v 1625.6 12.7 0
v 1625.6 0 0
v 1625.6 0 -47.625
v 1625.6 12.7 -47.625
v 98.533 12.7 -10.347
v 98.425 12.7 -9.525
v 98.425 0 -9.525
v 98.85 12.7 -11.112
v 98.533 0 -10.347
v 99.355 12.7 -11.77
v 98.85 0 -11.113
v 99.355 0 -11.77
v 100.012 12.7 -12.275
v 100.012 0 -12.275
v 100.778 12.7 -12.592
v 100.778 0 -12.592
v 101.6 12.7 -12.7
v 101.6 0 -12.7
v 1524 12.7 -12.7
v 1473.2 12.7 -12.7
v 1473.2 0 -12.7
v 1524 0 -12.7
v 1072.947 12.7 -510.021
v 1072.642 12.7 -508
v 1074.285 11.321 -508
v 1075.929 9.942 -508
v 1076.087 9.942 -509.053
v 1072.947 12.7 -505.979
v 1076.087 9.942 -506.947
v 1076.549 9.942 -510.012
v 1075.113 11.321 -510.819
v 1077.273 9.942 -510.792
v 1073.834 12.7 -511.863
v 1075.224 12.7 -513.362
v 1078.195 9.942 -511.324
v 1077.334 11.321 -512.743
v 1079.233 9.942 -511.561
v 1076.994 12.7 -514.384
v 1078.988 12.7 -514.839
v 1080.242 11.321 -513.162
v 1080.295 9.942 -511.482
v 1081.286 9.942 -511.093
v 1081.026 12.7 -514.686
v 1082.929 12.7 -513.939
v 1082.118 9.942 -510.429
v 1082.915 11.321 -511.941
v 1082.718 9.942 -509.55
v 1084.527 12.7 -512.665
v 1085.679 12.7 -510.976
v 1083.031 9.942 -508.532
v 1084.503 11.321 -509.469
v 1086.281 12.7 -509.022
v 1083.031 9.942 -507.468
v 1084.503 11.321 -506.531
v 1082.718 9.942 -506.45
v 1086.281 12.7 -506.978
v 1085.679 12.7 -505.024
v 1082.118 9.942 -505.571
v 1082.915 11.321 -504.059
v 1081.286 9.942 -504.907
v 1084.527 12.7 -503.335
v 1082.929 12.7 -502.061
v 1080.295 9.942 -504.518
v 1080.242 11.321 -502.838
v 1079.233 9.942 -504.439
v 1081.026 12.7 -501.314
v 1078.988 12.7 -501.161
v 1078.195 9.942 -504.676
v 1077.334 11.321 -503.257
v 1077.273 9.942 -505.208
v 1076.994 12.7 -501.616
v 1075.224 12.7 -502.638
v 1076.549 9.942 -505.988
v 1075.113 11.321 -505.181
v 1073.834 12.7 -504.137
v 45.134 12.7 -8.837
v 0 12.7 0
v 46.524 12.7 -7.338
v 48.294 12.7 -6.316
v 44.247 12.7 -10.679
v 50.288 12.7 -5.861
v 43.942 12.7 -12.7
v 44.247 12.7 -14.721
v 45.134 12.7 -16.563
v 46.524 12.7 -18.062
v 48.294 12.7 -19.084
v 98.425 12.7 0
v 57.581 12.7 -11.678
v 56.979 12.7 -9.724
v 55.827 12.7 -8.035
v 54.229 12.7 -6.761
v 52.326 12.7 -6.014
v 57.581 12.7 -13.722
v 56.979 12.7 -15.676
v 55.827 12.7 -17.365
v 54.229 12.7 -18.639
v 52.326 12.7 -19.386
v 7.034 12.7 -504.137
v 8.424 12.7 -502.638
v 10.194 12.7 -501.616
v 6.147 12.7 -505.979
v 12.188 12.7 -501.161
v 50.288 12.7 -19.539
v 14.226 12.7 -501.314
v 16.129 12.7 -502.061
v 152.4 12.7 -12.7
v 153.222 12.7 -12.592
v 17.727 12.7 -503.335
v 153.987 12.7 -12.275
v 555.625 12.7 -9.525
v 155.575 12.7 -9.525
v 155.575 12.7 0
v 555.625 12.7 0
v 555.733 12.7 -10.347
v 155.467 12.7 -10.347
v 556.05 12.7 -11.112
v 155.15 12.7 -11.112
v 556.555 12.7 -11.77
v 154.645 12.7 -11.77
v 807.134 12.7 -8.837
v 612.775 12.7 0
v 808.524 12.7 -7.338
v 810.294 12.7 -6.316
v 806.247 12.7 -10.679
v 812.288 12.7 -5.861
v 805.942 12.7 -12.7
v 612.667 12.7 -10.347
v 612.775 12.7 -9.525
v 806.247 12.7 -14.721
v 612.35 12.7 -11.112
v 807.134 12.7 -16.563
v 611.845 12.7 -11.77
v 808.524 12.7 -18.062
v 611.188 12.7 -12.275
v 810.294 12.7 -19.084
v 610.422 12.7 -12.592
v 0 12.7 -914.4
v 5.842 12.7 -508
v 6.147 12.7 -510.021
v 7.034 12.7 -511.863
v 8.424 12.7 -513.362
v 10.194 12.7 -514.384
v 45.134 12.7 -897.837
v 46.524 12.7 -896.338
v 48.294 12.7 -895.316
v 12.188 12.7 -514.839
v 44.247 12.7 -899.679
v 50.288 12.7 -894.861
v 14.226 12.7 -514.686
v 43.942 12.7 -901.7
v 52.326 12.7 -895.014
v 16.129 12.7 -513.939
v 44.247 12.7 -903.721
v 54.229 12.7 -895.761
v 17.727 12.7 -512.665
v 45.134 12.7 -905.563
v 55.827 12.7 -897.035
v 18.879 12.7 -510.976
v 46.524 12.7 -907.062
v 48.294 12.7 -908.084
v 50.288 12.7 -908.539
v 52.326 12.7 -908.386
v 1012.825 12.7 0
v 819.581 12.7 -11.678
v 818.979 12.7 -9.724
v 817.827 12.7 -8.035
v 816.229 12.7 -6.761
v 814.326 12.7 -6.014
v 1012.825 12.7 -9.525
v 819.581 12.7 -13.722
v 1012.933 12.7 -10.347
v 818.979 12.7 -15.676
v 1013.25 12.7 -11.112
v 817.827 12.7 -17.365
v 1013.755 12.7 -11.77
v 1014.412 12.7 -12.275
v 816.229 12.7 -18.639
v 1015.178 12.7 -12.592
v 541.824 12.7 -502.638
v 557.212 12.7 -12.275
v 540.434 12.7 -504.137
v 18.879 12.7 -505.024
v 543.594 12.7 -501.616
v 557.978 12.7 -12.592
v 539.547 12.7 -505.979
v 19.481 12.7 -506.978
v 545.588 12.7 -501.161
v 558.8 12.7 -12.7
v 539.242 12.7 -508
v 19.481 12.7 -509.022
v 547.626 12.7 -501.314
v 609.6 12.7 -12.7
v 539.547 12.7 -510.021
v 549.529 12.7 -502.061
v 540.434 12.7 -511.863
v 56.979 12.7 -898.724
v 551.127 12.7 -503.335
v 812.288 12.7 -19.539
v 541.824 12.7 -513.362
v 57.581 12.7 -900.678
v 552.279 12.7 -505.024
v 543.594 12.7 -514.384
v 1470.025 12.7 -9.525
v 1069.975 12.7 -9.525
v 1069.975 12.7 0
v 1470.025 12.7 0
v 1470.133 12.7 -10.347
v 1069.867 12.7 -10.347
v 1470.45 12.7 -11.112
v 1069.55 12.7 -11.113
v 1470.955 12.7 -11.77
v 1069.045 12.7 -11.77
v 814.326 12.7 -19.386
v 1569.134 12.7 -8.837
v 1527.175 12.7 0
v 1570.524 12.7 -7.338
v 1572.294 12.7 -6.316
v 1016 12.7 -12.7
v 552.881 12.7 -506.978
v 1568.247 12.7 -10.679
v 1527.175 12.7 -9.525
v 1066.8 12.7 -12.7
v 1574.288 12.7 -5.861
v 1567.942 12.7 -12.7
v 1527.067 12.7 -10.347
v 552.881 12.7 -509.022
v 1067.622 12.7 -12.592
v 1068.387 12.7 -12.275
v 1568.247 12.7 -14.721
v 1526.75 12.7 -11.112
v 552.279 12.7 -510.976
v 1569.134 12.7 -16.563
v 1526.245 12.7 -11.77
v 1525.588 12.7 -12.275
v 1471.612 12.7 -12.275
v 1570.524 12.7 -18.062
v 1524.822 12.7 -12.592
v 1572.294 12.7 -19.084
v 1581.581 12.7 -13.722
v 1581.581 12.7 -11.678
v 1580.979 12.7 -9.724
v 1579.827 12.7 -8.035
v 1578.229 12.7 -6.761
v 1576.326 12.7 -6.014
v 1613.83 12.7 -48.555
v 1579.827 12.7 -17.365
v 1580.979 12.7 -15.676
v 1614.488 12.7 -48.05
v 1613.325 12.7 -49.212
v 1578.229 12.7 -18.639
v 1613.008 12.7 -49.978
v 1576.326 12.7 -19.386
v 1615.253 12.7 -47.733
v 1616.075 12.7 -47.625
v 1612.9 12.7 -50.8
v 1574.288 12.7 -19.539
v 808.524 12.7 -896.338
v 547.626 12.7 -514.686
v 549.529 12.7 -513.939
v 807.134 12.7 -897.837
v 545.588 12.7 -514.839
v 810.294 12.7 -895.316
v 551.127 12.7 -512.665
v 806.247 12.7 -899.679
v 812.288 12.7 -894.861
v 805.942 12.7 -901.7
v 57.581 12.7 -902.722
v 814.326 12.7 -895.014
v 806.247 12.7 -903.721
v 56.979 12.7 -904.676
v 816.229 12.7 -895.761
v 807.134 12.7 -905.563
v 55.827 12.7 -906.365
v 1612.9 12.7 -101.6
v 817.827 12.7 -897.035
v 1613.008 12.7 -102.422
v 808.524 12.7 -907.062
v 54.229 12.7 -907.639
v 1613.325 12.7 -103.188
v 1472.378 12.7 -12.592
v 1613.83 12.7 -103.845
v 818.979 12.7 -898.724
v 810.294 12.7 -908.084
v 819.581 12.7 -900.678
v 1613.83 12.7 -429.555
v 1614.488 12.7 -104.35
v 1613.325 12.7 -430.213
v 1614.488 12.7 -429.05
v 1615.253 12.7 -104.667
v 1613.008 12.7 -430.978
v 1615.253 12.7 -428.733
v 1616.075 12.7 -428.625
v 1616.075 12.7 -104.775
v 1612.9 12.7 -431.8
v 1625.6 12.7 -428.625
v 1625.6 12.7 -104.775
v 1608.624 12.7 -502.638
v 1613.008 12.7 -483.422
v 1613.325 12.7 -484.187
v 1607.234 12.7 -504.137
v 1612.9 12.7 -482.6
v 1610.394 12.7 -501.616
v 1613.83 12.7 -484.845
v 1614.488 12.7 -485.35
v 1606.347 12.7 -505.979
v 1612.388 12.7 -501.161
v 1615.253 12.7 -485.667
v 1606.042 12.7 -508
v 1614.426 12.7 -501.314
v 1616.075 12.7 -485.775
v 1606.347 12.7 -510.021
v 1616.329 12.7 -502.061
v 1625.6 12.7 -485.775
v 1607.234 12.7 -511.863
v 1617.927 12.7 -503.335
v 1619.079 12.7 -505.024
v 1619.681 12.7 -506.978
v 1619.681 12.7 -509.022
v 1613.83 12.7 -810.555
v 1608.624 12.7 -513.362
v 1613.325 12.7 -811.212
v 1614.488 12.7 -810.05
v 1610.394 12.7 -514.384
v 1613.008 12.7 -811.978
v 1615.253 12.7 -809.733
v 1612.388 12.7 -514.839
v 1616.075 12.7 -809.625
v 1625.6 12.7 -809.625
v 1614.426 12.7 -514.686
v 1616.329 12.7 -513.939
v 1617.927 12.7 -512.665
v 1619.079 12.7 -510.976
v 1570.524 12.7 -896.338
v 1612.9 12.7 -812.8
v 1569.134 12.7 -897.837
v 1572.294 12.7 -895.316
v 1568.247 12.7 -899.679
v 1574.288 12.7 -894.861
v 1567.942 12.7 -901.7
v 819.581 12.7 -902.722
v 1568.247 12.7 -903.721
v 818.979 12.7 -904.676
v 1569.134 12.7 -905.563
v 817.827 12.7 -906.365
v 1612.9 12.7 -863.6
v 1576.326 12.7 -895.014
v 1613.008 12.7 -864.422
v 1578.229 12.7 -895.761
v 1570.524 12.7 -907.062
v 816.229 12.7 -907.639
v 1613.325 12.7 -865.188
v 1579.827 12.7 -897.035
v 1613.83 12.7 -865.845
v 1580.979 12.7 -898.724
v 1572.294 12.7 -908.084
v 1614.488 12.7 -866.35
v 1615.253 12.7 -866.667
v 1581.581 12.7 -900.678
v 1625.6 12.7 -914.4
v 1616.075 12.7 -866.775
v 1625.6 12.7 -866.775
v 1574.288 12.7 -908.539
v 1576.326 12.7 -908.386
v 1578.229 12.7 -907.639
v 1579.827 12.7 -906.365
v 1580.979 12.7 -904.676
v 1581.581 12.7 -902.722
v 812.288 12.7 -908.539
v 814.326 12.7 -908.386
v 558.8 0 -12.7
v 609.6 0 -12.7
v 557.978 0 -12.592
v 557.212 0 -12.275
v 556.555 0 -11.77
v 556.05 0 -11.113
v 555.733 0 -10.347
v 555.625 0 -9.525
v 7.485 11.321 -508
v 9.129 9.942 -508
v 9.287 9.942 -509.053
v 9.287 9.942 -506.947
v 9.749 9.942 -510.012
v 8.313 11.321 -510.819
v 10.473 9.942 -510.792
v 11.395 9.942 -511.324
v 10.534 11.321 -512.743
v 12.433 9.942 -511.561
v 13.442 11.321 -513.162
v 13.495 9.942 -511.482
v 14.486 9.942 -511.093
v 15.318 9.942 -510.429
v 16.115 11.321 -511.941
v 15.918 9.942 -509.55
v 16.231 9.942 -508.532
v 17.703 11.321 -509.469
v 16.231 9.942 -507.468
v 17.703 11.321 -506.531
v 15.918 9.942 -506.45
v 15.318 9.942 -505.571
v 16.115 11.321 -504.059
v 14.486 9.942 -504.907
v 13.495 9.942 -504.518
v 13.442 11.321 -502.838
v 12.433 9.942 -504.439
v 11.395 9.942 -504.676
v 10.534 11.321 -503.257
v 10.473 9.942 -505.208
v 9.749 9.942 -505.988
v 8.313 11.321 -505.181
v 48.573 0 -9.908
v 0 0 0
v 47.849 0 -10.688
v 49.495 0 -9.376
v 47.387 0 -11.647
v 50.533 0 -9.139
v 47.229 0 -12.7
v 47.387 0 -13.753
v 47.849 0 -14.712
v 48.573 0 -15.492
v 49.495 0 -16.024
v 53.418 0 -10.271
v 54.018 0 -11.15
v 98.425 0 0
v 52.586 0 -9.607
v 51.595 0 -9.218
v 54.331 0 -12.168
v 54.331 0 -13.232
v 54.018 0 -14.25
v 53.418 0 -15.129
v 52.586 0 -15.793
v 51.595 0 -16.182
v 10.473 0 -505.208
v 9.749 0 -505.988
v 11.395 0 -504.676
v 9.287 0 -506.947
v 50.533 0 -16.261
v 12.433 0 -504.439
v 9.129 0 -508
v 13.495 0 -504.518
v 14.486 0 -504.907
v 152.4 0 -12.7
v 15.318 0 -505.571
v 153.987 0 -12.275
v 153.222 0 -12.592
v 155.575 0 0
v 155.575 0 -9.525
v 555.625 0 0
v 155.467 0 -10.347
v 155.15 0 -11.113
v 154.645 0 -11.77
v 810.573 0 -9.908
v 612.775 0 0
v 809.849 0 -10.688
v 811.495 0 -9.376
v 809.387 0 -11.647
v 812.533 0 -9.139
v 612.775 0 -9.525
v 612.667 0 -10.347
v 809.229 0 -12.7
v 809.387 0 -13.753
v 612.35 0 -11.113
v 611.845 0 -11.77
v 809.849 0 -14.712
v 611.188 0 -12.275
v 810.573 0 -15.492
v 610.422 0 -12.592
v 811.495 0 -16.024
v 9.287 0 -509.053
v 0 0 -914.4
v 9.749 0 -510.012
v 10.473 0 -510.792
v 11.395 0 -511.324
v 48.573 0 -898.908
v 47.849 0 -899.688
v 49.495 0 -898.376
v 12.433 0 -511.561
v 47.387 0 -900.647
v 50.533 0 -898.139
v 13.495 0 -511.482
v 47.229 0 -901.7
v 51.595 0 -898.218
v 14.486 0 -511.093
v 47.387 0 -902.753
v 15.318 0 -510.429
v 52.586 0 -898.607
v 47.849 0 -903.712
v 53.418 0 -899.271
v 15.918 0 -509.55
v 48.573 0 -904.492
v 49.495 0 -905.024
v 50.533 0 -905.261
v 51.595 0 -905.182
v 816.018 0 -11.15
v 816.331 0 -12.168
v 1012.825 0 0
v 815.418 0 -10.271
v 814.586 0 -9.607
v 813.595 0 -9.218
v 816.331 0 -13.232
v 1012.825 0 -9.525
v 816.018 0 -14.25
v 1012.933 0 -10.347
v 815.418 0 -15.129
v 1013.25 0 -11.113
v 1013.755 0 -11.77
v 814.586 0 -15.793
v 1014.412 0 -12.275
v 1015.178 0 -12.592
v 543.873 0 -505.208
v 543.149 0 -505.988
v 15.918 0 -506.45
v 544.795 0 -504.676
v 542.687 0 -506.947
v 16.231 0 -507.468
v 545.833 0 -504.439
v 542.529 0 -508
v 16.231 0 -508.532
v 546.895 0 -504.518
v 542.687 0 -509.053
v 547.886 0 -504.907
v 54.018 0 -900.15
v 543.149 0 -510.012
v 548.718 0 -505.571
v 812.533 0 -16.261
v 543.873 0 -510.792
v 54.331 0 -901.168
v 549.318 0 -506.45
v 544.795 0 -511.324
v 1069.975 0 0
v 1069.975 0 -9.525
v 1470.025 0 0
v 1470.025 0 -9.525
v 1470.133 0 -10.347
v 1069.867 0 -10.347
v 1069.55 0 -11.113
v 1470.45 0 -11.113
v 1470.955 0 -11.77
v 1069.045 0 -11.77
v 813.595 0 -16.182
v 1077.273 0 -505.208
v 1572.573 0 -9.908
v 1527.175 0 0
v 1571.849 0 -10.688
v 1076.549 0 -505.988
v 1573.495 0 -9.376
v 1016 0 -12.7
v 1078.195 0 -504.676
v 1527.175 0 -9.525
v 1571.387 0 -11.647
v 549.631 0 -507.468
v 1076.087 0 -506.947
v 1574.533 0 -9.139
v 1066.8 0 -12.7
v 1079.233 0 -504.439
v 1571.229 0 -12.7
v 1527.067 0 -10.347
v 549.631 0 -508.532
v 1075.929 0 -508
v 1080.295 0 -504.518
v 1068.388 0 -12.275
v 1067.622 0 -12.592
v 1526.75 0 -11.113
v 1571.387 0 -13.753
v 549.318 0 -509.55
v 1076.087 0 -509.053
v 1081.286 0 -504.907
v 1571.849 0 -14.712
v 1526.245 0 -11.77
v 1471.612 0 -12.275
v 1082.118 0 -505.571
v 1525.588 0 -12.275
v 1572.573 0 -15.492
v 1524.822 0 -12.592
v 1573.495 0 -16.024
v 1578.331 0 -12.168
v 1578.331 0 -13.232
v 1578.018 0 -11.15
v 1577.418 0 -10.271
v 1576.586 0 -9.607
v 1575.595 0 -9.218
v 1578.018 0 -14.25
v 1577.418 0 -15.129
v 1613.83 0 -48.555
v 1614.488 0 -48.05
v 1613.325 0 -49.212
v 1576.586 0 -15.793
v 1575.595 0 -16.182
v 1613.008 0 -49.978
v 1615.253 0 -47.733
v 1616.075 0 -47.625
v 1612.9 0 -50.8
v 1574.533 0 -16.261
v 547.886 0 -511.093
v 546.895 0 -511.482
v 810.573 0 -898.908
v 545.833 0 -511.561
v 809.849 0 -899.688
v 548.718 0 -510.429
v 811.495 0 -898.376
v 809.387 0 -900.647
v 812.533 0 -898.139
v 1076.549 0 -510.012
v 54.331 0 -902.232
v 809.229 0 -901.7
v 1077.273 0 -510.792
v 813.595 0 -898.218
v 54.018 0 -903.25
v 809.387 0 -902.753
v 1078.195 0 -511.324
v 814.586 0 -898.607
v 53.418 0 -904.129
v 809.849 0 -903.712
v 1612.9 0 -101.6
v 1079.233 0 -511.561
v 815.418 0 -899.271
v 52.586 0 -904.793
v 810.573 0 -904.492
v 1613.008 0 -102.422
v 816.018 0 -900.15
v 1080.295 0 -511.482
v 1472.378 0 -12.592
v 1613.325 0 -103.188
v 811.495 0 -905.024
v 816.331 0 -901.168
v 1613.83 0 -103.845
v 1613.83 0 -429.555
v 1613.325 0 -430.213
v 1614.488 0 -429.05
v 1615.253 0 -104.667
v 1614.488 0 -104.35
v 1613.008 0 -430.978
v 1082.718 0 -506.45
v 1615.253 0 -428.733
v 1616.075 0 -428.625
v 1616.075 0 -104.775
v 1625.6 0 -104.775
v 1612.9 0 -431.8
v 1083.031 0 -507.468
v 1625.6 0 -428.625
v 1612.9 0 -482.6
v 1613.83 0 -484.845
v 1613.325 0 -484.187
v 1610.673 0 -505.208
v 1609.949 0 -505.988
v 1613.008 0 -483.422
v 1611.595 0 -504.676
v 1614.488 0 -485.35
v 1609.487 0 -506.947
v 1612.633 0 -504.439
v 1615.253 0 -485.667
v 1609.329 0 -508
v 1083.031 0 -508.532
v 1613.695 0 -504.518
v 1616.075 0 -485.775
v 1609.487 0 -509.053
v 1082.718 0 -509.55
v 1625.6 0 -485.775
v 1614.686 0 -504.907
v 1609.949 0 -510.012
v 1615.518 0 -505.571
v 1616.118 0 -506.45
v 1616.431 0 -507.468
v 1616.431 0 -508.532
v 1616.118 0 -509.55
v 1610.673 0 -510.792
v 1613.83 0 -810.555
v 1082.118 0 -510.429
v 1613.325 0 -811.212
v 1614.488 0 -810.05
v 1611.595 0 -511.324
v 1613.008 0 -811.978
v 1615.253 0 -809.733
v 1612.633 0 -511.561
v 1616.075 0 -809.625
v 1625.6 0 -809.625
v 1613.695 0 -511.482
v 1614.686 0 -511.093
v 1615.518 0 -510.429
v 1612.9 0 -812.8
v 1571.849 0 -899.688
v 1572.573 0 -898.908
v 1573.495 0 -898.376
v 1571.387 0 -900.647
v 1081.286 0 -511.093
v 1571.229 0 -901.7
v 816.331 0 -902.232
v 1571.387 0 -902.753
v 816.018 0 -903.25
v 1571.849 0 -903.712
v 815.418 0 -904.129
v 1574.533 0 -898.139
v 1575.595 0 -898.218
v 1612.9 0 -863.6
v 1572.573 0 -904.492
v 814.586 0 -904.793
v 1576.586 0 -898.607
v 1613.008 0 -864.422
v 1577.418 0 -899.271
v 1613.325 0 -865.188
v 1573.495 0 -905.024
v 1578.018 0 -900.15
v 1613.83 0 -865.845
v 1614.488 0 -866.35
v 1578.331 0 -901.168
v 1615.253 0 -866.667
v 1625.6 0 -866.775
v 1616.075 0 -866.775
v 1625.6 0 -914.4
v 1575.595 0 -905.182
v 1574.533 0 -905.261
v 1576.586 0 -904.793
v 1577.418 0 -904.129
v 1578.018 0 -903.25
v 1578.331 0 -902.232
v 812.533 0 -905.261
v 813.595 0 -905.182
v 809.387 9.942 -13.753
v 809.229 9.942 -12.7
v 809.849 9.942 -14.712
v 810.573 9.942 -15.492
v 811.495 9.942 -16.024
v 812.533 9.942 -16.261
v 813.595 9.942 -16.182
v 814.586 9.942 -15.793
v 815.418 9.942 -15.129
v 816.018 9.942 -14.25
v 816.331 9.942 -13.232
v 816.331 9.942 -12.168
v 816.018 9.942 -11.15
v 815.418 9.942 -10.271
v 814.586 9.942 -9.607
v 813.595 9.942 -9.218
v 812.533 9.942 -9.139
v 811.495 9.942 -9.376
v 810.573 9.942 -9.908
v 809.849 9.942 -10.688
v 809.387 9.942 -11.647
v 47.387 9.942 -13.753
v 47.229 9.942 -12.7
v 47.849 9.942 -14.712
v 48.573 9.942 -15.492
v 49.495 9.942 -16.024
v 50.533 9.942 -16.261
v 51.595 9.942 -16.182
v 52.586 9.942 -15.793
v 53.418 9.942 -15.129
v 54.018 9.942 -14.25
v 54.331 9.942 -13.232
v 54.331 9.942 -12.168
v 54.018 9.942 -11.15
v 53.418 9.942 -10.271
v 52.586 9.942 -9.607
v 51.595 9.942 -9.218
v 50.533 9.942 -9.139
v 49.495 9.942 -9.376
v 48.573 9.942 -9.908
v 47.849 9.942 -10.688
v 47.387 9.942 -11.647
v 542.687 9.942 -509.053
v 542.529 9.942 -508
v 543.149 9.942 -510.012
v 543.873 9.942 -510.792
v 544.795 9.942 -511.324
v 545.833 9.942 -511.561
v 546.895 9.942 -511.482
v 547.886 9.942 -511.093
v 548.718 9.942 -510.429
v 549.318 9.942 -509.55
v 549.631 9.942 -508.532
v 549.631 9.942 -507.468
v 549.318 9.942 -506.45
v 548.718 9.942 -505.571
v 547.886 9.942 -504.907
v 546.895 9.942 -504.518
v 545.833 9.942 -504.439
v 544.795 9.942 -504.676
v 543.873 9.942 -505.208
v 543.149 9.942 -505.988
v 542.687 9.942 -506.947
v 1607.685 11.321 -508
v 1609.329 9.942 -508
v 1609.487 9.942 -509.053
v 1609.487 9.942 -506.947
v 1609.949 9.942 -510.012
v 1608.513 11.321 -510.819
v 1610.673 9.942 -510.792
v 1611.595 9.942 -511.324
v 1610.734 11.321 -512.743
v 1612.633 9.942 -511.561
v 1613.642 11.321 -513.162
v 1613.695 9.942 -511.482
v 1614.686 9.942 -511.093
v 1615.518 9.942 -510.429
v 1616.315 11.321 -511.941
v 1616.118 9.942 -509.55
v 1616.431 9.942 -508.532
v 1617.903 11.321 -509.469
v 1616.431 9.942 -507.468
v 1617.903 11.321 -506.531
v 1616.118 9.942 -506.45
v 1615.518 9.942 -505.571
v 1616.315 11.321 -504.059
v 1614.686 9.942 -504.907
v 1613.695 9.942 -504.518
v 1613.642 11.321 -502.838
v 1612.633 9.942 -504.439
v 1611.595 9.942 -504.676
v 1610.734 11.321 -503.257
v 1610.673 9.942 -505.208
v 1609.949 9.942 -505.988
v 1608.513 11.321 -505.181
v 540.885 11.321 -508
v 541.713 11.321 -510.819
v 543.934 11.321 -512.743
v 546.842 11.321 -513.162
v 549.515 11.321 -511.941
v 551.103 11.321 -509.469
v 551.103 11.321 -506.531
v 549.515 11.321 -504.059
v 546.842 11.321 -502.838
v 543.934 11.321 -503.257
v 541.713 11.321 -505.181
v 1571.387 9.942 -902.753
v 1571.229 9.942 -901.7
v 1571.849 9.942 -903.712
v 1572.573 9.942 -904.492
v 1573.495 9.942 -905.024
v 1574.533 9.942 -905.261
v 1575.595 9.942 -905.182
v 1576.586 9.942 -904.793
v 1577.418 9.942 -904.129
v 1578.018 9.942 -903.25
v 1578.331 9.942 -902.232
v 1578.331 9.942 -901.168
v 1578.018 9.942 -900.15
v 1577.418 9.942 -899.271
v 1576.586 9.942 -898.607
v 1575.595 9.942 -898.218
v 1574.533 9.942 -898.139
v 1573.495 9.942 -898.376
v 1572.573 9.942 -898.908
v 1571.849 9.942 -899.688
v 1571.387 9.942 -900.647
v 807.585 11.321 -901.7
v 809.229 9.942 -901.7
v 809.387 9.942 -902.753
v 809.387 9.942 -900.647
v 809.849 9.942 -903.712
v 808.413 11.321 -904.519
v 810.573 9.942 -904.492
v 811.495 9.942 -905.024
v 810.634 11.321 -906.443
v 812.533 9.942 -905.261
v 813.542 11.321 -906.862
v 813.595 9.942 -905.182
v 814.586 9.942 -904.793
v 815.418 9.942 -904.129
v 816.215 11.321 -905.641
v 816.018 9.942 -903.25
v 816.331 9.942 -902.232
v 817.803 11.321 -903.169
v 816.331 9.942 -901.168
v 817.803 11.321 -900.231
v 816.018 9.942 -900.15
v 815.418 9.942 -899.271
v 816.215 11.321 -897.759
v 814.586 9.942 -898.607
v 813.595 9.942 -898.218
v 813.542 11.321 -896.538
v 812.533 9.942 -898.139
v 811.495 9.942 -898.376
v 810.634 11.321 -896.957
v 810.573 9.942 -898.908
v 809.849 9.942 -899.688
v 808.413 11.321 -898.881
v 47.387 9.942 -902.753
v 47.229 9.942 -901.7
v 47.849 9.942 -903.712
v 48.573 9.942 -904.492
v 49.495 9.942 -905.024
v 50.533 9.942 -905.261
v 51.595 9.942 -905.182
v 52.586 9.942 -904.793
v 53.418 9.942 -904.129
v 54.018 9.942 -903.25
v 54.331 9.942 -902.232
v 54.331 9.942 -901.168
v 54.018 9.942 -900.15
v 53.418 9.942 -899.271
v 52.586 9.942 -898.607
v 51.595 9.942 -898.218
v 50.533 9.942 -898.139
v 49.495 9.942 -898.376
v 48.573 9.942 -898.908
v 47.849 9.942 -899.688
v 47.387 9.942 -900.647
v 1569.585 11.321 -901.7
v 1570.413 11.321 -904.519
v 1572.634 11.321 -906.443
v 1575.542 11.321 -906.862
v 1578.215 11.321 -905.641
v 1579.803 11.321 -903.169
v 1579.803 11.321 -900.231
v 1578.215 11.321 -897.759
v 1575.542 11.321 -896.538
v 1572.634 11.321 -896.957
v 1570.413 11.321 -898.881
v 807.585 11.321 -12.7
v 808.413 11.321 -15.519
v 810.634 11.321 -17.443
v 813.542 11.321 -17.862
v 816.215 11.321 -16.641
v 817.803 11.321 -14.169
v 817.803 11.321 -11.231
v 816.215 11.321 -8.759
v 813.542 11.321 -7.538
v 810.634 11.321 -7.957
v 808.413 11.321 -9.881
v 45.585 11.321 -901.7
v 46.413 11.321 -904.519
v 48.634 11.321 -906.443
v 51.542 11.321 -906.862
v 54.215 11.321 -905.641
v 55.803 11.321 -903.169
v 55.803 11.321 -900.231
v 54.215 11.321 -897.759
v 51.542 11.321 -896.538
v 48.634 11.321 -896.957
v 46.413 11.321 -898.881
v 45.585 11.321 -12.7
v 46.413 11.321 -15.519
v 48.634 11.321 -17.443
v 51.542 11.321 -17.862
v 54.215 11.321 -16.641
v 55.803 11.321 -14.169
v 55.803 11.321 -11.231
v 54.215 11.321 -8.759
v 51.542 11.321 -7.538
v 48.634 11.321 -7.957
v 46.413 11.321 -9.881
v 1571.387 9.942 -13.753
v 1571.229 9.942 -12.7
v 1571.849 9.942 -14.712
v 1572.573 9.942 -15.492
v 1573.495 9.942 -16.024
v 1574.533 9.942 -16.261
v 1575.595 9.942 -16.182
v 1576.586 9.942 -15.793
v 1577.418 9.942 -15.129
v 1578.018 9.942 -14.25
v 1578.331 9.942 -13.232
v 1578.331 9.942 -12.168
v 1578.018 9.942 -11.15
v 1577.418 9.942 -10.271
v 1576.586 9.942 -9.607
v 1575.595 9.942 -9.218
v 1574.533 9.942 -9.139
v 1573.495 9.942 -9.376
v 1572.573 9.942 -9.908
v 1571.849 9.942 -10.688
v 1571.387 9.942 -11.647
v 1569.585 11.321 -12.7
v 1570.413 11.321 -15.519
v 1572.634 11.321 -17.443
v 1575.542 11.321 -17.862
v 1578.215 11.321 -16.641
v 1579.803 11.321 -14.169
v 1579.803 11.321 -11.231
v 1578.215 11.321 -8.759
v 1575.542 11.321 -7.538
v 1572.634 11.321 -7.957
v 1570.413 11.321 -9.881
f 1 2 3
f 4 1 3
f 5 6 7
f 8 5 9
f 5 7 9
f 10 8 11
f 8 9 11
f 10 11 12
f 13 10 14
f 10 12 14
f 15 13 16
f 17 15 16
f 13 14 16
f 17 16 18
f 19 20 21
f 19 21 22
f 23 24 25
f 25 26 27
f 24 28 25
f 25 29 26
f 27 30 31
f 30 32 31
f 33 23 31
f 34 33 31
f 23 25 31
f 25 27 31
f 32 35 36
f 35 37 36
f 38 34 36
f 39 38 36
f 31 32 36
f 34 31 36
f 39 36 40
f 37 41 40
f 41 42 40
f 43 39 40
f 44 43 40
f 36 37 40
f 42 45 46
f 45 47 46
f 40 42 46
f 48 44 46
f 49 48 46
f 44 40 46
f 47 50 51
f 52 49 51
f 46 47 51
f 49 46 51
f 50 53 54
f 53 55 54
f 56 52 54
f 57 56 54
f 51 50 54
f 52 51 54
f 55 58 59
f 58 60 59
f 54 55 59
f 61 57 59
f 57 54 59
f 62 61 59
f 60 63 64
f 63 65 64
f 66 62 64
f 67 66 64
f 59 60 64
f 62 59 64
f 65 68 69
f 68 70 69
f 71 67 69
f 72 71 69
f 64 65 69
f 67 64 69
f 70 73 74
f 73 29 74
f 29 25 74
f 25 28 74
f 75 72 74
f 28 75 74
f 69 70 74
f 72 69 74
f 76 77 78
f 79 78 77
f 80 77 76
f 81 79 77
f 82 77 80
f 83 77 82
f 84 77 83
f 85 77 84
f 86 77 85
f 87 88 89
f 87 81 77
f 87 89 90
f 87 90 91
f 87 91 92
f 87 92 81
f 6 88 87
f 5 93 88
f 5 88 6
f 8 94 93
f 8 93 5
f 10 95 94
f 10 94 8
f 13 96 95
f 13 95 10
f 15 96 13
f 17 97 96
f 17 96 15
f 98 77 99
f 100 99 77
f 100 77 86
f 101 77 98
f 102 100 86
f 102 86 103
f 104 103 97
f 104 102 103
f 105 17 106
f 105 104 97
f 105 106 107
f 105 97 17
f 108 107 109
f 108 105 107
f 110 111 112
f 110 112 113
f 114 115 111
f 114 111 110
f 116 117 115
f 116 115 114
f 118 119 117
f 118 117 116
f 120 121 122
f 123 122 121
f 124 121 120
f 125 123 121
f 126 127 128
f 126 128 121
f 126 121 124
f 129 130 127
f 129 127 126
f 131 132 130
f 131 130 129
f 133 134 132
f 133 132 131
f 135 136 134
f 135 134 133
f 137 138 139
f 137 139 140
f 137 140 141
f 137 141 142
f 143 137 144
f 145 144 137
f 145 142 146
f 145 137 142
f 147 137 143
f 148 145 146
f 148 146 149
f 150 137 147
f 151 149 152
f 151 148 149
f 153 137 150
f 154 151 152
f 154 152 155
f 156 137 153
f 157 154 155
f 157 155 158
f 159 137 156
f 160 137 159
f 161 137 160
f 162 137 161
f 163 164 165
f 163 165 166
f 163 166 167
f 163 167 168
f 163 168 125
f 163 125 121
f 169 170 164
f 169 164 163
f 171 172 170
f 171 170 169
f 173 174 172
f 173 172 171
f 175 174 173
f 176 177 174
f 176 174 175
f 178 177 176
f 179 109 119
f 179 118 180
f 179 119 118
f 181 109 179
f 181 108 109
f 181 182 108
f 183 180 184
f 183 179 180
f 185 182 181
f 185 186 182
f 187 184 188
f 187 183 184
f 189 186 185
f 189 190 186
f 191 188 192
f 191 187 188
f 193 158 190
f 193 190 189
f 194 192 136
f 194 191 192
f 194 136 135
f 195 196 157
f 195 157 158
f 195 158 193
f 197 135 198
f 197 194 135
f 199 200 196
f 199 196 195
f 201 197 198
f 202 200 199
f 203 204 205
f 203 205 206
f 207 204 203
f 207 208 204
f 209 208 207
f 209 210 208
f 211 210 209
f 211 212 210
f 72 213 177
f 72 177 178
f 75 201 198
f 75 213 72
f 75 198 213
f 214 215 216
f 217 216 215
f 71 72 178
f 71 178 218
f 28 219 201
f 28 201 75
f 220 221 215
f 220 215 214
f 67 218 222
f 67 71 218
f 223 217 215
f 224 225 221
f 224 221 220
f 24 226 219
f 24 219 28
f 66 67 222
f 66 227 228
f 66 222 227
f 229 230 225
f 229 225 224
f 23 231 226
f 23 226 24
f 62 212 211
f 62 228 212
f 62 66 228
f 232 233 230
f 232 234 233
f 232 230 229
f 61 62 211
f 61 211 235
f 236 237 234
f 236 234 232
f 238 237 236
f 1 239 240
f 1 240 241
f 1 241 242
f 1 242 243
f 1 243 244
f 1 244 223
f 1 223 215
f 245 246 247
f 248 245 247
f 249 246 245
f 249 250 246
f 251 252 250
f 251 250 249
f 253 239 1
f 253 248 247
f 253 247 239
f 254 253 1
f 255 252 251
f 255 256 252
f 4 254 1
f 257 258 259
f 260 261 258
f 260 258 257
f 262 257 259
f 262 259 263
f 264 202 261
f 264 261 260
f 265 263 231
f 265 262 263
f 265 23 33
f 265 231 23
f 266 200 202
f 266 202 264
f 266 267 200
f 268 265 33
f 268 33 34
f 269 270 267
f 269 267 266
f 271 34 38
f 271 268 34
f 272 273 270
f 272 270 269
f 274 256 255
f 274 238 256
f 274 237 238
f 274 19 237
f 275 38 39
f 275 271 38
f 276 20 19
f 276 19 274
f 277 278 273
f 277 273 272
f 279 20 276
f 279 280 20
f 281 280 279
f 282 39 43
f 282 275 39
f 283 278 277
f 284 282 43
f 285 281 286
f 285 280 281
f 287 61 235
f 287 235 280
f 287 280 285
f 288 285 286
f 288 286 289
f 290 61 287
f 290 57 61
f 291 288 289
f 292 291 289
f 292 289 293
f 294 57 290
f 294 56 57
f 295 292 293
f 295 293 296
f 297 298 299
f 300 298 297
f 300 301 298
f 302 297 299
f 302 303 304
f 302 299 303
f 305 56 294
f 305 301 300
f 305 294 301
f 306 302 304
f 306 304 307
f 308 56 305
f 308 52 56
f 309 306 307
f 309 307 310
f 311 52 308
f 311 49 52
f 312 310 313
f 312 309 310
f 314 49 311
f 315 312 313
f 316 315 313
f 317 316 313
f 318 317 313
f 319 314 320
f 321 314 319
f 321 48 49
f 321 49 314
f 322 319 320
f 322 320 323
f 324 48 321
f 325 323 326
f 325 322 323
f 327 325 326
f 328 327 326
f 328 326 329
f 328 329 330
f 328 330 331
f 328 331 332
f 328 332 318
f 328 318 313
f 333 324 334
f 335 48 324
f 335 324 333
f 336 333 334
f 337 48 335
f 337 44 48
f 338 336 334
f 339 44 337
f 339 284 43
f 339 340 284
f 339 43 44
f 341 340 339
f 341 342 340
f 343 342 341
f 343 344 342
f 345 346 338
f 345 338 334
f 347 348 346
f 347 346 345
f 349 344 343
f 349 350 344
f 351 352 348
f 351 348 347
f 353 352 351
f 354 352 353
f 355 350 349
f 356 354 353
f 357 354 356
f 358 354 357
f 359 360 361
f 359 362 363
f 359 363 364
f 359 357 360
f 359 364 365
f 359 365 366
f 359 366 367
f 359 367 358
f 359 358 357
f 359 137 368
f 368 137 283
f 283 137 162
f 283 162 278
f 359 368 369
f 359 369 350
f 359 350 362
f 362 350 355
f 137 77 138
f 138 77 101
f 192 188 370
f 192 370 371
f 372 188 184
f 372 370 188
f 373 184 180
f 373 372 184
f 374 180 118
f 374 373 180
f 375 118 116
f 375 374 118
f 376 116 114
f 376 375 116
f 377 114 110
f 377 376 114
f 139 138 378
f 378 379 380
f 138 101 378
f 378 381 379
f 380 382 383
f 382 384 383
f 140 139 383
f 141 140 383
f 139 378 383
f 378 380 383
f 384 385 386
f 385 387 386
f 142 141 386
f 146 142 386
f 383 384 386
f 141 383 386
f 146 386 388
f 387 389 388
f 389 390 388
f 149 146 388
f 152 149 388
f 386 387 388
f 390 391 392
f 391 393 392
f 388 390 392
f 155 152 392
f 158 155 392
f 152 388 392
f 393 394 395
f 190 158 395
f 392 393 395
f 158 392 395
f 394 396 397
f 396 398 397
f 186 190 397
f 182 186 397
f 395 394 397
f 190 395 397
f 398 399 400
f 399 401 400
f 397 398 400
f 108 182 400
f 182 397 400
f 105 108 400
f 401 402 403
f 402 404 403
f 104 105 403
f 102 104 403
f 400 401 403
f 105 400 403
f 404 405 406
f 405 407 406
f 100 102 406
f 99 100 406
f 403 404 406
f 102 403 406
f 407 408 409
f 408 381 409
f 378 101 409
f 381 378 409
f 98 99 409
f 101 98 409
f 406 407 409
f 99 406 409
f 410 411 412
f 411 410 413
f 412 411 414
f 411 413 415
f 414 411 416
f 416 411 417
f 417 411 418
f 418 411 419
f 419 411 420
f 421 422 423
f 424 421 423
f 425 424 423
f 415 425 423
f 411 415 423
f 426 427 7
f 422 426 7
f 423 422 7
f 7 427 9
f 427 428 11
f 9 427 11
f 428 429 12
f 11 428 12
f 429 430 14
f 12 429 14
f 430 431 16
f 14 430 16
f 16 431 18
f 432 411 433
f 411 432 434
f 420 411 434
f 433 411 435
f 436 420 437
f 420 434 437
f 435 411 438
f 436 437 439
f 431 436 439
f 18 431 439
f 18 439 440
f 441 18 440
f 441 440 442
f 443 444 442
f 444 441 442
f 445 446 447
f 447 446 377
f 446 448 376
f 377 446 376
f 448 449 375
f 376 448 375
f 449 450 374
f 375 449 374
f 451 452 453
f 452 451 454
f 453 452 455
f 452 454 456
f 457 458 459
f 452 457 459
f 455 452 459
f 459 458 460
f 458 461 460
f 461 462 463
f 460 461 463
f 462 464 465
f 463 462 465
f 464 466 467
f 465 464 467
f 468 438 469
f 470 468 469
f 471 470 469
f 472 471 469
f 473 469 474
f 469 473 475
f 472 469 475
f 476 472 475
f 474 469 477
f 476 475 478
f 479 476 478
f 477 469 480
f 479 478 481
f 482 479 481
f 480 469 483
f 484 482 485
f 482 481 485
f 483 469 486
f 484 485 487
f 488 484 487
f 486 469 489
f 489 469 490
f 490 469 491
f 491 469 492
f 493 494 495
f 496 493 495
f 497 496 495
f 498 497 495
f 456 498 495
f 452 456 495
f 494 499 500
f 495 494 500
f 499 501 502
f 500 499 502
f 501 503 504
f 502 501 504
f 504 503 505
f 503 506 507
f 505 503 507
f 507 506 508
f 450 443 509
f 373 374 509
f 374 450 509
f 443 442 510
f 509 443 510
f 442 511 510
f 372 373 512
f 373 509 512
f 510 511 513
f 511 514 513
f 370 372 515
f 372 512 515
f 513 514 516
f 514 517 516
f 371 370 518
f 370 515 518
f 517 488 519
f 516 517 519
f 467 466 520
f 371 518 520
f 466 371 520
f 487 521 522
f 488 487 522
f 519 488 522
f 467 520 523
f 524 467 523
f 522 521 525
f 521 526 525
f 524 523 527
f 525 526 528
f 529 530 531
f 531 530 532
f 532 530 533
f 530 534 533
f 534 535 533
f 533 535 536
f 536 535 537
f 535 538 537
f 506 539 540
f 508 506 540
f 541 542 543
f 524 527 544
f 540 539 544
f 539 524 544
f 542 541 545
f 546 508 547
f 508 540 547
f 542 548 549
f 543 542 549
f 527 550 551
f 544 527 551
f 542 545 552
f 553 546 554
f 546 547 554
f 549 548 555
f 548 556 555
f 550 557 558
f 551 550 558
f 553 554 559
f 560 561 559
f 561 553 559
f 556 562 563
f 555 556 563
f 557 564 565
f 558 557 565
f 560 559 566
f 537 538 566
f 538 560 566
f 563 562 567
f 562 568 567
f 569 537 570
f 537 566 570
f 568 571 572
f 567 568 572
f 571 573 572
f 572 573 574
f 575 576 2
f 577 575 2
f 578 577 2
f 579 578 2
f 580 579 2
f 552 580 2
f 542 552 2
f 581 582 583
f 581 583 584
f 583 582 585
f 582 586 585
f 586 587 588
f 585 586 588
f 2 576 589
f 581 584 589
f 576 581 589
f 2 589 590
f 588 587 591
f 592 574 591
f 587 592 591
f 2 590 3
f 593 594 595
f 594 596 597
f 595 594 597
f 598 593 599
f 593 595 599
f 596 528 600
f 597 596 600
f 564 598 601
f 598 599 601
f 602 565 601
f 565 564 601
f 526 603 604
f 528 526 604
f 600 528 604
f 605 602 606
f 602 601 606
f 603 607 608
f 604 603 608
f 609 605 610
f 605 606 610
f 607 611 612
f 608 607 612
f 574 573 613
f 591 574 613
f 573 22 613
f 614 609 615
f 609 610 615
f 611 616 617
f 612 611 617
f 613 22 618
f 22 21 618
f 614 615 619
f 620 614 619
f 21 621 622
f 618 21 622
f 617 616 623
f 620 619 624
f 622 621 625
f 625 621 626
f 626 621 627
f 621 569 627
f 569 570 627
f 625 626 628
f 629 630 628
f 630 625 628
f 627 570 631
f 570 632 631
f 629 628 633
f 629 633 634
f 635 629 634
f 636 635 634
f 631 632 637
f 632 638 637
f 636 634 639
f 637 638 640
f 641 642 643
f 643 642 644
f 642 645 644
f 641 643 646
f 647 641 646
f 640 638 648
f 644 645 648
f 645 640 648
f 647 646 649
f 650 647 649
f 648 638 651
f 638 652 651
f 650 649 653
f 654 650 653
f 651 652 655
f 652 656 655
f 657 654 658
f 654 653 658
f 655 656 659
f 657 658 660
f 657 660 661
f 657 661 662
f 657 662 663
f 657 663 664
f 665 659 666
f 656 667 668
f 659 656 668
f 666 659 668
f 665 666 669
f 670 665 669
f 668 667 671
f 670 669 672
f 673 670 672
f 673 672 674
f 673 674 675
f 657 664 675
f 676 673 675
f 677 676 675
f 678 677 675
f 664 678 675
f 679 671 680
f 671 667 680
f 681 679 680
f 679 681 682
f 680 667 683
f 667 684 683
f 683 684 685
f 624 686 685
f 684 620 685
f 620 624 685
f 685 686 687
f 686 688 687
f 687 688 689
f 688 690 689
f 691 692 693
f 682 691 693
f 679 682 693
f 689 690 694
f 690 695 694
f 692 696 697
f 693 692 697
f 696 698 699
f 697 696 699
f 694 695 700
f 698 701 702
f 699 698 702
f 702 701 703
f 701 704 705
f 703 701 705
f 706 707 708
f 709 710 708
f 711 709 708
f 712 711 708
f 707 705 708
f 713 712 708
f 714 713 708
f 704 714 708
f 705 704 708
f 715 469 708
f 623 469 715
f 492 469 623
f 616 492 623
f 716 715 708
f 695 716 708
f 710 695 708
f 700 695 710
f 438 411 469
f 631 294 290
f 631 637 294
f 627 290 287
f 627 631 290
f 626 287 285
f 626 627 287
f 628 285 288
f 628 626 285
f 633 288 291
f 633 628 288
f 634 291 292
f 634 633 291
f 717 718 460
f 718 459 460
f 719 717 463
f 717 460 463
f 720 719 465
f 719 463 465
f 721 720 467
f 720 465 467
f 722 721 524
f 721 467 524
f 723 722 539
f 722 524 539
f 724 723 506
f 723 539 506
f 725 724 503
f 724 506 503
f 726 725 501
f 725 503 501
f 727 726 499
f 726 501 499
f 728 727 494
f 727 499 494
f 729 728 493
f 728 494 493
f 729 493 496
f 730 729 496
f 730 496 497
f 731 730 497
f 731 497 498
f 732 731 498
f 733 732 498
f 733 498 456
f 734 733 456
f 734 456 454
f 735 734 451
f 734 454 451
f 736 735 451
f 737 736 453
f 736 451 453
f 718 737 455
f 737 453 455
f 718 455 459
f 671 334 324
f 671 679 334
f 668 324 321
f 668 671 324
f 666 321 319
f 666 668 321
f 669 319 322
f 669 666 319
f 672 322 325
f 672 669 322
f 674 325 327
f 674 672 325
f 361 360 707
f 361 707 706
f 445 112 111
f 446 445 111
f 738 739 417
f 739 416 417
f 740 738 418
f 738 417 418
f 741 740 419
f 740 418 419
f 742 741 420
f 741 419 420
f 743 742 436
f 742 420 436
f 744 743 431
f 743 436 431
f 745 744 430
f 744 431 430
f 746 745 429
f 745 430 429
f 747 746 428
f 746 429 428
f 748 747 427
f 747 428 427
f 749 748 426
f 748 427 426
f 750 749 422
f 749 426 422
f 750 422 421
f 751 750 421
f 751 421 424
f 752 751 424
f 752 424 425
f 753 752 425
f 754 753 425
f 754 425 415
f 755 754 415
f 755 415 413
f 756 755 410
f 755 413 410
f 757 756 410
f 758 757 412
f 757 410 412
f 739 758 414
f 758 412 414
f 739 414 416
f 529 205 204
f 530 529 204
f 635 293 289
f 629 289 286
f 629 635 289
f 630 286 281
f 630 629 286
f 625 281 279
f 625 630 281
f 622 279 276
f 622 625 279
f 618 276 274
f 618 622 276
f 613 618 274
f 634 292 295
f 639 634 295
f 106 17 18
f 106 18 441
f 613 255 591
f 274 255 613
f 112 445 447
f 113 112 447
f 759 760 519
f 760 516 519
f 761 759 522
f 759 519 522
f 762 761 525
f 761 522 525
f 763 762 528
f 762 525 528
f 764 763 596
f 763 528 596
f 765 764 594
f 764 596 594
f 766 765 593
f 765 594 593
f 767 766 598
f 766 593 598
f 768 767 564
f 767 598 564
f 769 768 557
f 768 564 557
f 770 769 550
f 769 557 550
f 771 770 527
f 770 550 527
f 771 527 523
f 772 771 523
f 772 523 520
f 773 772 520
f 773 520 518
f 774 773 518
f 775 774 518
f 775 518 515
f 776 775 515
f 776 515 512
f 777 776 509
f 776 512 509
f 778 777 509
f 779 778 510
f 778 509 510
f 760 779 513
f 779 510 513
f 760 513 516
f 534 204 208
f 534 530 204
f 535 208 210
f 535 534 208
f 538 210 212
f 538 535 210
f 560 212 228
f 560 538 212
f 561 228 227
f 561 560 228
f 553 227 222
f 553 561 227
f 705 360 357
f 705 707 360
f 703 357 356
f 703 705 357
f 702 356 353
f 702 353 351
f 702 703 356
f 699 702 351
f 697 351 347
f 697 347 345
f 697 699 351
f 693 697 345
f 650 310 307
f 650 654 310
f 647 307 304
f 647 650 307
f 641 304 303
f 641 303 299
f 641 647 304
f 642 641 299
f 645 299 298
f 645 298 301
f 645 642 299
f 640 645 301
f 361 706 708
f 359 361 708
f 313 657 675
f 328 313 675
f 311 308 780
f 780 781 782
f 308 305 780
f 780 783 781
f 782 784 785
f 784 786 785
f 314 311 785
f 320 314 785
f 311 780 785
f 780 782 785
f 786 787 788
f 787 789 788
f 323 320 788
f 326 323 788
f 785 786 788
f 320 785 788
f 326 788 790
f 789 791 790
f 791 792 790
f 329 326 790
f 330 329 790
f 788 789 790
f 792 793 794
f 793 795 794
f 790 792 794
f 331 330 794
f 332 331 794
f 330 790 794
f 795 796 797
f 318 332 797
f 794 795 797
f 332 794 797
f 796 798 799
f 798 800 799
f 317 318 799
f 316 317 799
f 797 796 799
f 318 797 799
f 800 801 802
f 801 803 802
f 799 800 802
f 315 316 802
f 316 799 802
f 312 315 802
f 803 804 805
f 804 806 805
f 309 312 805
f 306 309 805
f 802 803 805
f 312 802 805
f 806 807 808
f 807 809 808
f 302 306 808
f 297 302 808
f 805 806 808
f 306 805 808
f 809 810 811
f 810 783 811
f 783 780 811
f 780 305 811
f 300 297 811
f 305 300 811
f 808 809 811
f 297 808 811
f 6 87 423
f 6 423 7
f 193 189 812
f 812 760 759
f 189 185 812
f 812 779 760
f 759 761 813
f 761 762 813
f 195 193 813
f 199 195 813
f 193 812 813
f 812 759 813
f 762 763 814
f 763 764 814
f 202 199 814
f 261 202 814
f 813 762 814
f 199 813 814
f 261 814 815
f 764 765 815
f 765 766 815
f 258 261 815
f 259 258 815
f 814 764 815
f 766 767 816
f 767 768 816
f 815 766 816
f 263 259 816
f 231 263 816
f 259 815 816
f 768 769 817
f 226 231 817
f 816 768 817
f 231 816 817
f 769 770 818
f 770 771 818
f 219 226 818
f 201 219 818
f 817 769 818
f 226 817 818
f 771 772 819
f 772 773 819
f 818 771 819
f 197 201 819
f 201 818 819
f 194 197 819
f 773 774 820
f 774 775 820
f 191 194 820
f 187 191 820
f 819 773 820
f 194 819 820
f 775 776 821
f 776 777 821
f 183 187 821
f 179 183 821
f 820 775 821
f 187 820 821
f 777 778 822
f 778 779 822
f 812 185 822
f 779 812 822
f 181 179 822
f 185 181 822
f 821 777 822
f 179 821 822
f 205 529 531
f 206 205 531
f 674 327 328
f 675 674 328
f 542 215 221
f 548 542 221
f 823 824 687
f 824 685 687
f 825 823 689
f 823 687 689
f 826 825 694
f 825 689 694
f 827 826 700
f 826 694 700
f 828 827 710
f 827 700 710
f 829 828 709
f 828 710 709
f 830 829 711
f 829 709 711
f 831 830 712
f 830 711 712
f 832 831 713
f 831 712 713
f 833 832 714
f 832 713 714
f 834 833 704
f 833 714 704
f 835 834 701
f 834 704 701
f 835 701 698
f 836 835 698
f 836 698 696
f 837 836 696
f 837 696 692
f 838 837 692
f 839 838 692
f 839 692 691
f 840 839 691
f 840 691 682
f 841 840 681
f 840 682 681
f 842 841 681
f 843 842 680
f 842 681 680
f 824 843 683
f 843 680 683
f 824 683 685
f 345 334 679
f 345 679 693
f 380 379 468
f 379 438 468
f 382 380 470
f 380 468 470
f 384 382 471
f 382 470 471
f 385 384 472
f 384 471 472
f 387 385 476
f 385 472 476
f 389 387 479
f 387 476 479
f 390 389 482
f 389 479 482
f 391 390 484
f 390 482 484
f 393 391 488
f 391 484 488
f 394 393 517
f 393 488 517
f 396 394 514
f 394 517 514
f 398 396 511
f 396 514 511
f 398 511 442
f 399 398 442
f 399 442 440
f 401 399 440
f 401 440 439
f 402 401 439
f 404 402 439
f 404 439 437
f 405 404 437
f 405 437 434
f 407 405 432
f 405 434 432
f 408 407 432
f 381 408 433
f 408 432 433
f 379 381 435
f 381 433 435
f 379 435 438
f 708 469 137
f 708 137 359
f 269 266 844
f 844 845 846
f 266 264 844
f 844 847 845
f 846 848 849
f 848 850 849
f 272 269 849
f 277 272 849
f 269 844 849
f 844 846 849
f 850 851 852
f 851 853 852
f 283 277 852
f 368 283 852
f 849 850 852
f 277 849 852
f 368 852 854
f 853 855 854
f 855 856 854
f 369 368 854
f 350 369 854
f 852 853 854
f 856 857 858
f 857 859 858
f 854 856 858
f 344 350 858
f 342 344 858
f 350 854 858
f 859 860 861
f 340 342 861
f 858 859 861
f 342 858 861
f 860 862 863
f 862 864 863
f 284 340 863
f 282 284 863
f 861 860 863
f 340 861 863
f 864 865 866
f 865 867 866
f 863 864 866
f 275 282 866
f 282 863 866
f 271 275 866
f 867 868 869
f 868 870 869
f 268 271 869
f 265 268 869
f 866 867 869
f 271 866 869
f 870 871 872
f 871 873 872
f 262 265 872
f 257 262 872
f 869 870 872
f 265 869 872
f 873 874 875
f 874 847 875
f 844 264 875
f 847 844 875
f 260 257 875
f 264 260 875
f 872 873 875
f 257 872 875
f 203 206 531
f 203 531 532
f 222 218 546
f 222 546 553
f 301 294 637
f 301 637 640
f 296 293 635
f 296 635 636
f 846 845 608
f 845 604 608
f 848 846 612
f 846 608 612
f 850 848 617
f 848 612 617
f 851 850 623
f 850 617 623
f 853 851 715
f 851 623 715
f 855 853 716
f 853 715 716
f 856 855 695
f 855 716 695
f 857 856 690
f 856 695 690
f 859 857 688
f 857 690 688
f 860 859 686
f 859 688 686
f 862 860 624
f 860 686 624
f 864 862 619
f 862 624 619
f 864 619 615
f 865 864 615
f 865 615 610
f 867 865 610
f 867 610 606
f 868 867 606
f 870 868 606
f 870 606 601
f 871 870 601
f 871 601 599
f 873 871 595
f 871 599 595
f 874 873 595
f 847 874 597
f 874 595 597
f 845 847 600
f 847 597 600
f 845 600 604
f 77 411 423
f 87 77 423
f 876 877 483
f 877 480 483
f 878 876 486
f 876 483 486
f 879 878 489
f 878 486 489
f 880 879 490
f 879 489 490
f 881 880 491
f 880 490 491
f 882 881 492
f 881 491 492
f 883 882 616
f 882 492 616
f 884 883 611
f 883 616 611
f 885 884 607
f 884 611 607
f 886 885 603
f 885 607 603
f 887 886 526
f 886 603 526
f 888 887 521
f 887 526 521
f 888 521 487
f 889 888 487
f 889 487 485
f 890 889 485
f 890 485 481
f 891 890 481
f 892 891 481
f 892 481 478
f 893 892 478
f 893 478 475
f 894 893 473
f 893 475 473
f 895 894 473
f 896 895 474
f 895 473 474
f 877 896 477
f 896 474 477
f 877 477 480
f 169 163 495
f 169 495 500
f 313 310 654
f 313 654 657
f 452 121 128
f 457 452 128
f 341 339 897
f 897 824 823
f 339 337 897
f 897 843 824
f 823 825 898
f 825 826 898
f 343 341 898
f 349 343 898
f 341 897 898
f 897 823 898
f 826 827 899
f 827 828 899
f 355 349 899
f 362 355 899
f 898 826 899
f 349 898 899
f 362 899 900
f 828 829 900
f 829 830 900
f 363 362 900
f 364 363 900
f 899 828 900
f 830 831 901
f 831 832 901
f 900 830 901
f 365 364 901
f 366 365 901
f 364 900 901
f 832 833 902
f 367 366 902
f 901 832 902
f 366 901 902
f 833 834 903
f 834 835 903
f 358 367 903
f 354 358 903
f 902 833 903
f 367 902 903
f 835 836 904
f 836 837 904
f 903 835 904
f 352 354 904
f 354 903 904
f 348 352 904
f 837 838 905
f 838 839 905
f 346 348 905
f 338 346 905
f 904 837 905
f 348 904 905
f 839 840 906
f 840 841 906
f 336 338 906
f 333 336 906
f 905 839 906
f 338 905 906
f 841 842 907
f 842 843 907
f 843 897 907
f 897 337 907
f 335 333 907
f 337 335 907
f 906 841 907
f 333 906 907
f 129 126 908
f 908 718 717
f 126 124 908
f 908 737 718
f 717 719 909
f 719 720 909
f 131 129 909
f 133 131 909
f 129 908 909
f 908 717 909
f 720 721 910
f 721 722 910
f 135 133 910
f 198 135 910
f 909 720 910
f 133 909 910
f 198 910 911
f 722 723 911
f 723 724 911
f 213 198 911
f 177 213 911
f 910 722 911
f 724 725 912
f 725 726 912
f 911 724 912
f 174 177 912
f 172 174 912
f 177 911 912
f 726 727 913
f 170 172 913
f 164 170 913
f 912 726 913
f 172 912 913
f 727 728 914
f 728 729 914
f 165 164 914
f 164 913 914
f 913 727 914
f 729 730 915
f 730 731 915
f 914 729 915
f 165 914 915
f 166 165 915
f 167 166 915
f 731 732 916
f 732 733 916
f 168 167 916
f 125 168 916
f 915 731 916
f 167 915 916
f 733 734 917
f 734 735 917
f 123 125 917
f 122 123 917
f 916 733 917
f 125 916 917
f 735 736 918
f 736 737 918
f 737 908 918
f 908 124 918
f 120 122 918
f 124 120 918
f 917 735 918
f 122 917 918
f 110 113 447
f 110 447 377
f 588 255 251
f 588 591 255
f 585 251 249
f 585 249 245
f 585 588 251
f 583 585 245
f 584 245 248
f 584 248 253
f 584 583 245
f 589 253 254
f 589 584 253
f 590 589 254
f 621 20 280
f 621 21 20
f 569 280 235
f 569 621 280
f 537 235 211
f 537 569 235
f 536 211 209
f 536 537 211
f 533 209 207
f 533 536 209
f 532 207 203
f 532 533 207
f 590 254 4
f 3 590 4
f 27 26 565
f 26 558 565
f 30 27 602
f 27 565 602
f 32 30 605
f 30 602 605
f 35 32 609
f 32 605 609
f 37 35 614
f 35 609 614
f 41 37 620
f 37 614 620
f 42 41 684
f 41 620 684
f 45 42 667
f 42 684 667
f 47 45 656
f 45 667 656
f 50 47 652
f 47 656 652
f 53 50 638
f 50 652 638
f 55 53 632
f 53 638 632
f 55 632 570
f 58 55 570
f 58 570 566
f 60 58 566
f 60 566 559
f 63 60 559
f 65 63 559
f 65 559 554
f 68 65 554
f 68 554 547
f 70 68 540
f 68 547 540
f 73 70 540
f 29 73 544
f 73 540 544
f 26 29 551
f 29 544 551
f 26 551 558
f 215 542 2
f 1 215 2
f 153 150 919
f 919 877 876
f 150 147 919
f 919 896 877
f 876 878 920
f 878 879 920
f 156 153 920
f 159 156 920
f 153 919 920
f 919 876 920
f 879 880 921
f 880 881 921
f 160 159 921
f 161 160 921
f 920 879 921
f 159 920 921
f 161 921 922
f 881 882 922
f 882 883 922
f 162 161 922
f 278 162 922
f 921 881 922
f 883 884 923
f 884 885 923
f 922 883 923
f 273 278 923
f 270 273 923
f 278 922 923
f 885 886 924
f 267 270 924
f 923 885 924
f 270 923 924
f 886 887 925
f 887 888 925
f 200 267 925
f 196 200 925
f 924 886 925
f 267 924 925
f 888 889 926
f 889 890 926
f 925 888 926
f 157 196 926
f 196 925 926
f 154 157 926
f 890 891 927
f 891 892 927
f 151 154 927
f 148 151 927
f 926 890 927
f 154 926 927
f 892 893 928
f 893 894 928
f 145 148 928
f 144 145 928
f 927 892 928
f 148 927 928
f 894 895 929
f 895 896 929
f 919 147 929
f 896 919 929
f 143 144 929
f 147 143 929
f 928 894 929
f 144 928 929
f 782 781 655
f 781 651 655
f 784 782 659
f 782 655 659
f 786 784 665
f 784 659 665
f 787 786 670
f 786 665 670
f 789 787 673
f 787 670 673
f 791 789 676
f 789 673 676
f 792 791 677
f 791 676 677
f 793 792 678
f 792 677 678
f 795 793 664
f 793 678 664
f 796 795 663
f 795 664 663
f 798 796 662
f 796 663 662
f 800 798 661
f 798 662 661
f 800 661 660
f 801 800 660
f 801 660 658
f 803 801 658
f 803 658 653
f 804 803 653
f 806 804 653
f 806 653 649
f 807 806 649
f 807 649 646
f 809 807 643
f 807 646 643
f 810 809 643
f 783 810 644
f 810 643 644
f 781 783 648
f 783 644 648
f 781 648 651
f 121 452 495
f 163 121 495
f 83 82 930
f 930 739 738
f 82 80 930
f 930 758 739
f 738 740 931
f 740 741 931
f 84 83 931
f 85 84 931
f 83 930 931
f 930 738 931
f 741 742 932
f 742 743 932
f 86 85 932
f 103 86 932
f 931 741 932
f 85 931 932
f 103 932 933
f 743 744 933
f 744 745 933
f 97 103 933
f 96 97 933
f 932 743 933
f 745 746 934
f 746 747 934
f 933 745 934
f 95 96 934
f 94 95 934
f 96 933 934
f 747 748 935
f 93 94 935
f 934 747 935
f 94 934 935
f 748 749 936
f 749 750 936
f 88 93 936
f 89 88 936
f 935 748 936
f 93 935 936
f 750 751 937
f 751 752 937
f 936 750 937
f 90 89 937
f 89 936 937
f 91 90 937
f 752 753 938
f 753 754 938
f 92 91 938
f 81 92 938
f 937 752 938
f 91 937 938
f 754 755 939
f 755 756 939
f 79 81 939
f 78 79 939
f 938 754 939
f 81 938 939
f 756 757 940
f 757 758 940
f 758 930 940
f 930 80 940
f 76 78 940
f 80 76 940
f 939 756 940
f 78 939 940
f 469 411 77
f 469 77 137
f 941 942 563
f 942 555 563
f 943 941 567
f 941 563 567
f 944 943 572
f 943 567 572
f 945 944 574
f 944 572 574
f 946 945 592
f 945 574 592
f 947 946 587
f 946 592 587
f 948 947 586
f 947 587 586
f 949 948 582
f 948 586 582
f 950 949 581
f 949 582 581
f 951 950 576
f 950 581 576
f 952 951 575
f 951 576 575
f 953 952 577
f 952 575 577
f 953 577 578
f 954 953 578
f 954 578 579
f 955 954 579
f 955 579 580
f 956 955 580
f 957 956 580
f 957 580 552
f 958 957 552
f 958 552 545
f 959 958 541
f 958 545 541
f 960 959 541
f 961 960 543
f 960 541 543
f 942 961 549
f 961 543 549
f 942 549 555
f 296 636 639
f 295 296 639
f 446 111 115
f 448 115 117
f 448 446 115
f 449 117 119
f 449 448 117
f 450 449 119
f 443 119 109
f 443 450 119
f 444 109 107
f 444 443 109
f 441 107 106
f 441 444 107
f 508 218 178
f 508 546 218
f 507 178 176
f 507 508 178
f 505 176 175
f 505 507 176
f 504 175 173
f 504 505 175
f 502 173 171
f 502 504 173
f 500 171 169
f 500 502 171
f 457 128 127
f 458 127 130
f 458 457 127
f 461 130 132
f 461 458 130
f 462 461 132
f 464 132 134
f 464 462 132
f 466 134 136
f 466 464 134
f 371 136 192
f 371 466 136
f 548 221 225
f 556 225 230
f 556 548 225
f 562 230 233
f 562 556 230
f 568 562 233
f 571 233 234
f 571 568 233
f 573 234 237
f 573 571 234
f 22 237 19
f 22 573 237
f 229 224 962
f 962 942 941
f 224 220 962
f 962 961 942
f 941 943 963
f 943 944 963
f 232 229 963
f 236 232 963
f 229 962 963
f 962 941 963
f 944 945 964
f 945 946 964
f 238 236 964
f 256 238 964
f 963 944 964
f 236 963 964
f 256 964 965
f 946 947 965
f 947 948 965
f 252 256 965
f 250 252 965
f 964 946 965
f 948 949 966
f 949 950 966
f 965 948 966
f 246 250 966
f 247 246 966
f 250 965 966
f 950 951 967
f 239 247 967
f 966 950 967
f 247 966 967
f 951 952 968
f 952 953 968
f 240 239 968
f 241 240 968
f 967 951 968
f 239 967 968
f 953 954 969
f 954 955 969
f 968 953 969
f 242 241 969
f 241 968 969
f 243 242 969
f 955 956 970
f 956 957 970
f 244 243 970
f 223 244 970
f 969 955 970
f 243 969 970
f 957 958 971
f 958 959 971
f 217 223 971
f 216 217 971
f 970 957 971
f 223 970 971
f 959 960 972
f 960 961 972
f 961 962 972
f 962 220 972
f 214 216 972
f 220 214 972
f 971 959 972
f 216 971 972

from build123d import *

# Parameters (mm, degrees)
SKETCH1_W                                           = 1625.6
SKETCH1_H                                           = 914.4
BOSS_EXTRUDE1_DEPTH                                 = 12.7
CSK_FOR_1_4_FLAT_HEAD_MACHINE_SCREW_100_D           = 7.14248
CSK_FOR_1_4_FLAT_HEAD_MACHINE_SCREW_100_CSINK_D     = 13.716
CSK_FOR_1_4_FLAT_HEAD_MACHINE_SCREW_100_CSINK_ANGLE = 100
SKETCH5_W                                           = 57.15
SKETCH5_H                                           = 12.7
CUT_EXTRUDE1_DEPTH                                  = 13.7
LPATTERN1_COUNT                                     = 4
LPATTERN1_PITCH                                     = 457.2
SKETCH6_W                                           = 12.7
SKETCH6_H                                           = 57.15
CUT_EXTRUDE2_DEPTH                                  = 13.7
LPATTERN2_COUNT                                     = 3
LPATTERN2_PITCH                                     = 381
FILLET1_R                                           = 3.175


with BuildPart() as part:
    # Sketch1 → Boss-Extrude1 (new body)
    with BuildSketch(Plane(origin=(0, 0, 0), x_dir=(1, 0, 0), z_dir=(0, 1, 0))):
        with Locations((812.8, 457.2)):
            Rectangle(SKETCH1_W, SKETCH1_H)
    extrude(amount=BOSS_EXTRUDE1_DEPTH)

    # CSK for 1/4 Flat Head Machine Screw (100)1 (through all)
    with Locations(Plane(origin=(0, 12.7, 0), x_dir=(1, 0, 0), z_dir=(0, 1, 0))):
        with Locations((12.7, 508), (50.8, 901.7), (546.1, 508), (812.8, 901.7), (1079.5, 508), (1574.8, 901.7), (1612.9, 508), (1574.8, 12.7), (812.8, 12.7), (50.8, 12.7)):
            CounterSinkHole(CSK_FOR_1_4_FLAT_HEAD_MACHINE_SCREW_100_D / 2, CSK_FOR_1_4_FLAT_HEAD_MACHINE_SCREW_100_CSINK_D / 2, counter_sink_angle=CSK_FOR_1_4_FLAT_HEAD_MACHINE_SCREW_100_CSINK_ANGLE)

    # Sketch5 → Cut-Extrude1 (cut, through all)
    with BuildSketch(Plane(origin=(0, 12.7, 0), x_dir=(1, 0, 0), z_dir=(0, 1, 0))):
        with Locations((127, 6.35)):
            Rectangle(SKETCH5_W, SKETCH5_H)
    cut_extrude1 = extrude(amount=-CUT_EXTRUDE1_DEPTH, mode=Mode.SUBTRACT)

    # LPattern1: Cut-Extrude1 ×4
    with Locations(*[(i * LPATTERN1_PITCH, 0, 0) for i in range(1, LPATTERN1_COUNT)]):
        add(cut_extrude1, mode=Mode.SUBTRACT)

    # Sketch6 → Cut-Extrude2 (cut, through all)
    with BuildSketch(Plane(origin=(0, 12.7, 0), x_dir=(1, 0, 0), z_dir=(0, 1, 0))):
        with Locations((1619.25, 76.2)):
            Rectangle(SKETCH6_W, SKETCH6_H)
    cut_extrude2 = extrude(amount=-CUT_EXTRUDE2_DEPTH, mode=Mode.SUBTRACT)

    # LPattern2: Cut-Extrude2 ×3
    with Locations(*[(0, 0, -i * LPATTERN2_PITCH) for i in range(1, LPATTERN2_COUNT)]):
        add(cut_extrude2, mode=Mode.SUBTRACT)

    # Fillet1
    fillet1_edges = [part.edges().sort_by_distance(p)[0] for p in [
        (98.425, 6.35, -12.7),
        (155.575, 6.35, -12.7),
        (555.625, 6.35, -12.7),
        (612.775, 6.35, -12.7),
        (1012.825, 6.35, -12.7),
        (1069.975, 6.35, -12.7),
        (1470.025, 6.35, -12.7),
        (1527.175, 6.35, -12.7),
        (1612.9, 6.35, -47.625),
        (1612.9, 6.35, -104.775),
        (1612.9, 6.35, -428.625),
        (1612.9, 6.35, -485.775),
        (1612.9, 6.35, -809.625),
        (1612.9, 6.35, -866.775),
    ]]
    fillet(fillet1_edges, radius=FILLET1_R)


solid = part.part
